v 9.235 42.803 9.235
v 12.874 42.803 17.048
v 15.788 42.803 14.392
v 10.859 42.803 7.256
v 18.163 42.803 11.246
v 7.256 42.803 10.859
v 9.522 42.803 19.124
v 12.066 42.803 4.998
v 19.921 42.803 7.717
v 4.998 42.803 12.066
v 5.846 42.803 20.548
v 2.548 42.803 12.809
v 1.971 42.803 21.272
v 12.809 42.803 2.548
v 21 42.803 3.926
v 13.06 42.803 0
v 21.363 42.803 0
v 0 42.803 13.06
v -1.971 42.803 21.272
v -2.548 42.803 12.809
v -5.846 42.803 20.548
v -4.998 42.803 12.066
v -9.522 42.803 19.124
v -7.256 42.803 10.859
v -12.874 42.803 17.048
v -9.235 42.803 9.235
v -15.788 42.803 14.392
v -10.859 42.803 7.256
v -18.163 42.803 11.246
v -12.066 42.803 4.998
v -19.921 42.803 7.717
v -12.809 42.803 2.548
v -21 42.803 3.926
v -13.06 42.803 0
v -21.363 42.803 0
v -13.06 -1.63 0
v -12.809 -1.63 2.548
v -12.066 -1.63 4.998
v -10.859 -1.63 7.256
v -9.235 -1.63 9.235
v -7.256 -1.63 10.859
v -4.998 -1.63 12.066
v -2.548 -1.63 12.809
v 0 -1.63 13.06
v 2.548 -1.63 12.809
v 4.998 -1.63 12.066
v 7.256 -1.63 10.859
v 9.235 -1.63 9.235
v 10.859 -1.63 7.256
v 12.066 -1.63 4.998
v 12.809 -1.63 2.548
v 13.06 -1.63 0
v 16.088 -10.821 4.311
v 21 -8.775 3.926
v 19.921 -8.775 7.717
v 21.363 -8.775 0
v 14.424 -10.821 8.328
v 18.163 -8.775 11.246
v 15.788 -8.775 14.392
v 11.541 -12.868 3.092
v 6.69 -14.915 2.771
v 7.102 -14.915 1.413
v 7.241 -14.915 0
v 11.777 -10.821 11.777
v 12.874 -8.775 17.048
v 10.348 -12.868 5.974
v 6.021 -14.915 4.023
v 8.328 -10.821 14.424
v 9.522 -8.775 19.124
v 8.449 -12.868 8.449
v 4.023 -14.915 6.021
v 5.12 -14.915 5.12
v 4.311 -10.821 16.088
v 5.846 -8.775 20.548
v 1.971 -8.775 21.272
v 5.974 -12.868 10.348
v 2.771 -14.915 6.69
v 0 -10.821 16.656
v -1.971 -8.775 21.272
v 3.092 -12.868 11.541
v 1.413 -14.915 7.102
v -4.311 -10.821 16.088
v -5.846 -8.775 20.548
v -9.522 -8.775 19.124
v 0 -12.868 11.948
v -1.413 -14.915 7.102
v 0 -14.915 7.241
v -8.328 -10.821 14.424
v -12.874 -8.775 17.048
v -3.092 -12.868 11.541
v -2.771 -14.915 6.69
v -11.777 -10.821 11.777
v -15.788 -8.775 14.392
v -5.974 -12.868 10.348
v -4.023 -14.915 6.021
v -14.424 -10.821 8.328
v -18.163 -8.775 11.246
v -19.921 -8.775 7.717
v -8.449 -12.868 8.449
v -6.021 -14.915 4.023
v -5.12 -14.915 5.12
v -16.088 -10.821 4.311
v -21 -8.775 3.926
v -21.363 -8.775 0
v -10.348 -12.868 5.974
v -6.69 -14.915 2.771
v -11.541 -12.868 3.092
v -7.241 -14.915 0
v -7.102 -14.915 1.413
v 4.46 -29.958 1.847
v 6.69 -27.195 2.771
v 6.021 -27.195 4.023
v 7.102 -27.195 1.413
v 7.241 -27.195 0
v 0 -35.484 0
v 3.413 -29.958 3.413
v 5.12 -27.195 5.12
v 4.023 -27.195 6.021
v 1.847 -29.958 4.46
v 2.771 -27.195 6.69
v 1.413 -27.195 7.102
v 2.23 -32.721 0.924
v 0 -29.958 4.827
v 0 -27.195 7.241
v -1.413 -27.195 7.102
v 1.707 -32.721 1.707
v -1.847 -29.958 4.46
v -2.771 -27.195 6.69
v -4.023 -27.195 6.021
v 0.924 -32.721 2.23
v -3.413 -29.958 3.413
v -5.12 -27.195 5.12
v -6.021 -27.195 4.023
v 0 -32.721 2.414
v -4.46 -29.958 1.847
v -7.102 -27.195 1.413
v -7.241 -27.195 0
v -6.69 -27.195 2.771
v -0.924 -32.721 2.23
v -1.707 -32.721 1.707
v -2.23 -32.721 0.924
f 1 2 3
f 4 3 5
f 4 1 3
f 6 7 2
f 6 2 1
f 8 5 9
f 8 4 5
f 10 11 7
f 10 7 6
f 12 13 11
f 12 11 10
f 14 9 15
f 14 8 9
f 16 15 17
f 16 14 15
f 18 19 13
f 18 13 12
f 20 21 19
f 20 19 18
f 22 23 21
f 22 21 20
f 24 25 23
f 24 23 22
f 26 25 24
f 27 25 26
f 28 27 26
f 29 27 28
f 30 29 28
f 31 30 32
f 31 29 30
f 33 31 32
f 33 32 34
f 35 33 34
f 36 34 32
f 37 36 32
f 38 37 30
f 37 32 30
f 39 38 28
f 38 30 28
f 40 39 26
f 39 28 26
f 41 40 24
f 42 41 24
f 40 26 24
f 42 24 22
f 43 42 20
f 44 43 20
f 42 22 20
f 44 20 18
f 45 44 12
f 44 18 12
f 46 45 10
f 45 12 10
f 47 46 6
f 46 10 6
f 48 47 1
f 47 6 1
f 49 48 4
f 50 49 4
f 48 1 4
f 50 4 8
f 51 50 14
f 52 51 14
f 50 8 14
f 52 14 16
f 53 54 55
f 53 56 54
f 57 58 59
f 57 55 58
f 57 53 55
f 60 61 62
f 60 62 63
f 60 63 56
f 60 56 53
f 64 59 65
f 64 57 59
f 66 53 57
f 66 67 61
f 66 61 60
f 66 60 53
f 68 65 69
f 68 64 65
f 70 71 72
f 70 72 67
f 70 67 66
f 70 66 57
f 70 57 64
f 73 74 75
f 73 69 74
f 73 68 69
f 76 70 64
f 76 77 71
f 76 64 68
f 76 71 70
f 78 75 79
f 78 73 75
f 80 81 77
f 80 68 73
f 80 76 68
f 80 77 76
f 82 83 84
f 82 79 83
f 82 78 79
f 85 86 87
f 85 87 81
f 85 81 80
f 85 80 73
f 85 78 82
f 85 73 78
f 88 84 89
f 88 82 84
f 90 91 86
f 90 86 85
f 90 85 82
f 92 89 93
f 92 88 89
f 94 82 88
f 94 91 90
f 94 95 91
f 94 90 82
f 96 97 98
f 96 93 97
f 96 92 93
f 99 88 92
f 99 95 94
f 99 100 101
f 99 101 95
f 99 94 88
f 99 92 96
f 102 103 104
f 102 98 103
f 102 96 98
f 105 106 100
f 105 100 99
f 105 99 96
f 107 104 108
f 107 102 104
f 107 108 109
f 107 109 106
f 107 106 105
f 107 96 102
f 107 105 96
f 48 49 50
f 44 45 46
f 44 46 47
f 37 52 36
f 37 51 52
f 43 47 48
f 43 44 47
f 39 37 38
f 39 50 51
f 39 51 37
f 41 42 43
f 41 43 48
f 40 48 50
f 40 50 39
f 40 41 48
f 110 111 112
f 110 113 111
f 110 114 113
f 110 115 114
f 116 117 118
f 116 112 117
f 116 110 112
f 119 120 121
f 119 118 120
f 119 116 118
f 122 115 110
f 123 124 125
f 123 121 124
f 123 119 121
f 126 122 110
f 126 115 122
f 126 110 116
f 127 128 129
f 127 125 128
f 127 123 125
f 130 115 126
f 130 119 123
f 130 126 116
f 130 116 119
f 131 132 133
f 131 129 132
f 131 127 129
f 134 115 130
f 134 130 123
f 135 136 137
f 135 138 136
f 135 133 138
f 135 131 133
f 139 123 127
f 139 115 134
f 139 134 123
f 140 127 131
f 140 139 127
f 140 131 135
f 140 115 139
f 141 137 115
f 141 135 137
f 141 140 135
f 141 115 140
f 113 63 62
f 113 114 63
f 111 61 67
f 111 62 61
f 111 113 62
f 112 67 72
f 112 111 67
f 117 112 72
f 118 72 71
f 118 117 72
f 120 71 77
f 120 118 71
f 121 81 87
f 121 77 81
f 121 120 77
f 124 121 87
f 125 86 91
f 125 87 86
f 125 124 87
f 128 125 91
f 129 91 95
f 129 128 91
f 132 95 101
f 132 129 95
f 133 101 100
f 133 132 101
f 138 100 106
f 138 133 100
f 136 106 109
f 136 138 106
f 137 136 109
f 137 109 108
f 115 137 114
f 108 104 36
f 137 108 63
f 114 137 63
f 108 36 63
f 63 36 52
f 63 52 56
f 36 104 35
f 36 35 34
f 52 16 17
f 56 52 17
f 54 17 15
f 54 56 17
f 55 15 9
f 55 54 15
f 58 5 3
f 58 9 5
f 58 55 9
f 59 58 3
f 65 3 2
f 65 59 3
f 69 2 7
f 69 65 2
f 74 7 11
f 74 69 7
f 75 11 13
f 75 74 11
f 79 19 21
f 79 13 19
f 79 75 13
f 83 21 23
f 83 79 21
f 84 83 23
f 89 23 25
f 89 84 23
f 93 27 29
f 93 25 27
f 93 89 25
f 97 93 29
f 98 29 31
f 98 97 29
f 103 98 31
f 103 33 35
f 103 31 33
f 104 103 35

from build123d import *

# Parameters (mm, degrees)
F0_W     = 254
F0_H     = 254
F1_DEPTH = 82.87358
F4_R     = 13.060022
F5_DEPTH = 44.433


with BuildPart() as f1:
    # F0 (on Top) → F1 (new body)
    with BuildSketch(Plane.XY):
        Rectangle(F0_W, F0_H)
    extrude(amount=F1_DEPTH)


with BuildPart() as f3:
    # F2 (on Right) → F3 (revolve)
    with BuildSketch(Plane.YZ):
        Polygon((-27.195146, 7.24093), (-35.484381, 0), (42.802874, 0), (42.802874, 21.363337), (-8.774616, 21.363337), (-14.914793, 7.24093), align=None)
    revolve(axis=Axis((0, 3.659246, 0), (0, -1, 0)))


with BuildPart() as f5_tool:
    # F4 (on face) → F5 (new body)
    with BuildSketch(Plane(origin=(0, 42.802874, 0), x_dir=(-1, 0, 0), z_dir=(0, 1, 0))):
        Circle(F4_R)
    extrude(amount=-F5_DEPTH)


with BuildPart() as f1_1:
    add(f1.part)

    # F5: cut by f5_tool
    add(f5_tool.part, mode=Mode.SUBTRACT)


with BuildPart() as f3_1:
    add(f3.part)

    # F5: cut by f5_tool
    add(f5_tool.part, mode=Mode.SUBTRACT)


with BuildPart() as f1_2:
    add(f1_1.part)

    # F6: intersect F3
    add(f3_1.part, mode=Mode.INTERSECT)


solid = f1_2.part
